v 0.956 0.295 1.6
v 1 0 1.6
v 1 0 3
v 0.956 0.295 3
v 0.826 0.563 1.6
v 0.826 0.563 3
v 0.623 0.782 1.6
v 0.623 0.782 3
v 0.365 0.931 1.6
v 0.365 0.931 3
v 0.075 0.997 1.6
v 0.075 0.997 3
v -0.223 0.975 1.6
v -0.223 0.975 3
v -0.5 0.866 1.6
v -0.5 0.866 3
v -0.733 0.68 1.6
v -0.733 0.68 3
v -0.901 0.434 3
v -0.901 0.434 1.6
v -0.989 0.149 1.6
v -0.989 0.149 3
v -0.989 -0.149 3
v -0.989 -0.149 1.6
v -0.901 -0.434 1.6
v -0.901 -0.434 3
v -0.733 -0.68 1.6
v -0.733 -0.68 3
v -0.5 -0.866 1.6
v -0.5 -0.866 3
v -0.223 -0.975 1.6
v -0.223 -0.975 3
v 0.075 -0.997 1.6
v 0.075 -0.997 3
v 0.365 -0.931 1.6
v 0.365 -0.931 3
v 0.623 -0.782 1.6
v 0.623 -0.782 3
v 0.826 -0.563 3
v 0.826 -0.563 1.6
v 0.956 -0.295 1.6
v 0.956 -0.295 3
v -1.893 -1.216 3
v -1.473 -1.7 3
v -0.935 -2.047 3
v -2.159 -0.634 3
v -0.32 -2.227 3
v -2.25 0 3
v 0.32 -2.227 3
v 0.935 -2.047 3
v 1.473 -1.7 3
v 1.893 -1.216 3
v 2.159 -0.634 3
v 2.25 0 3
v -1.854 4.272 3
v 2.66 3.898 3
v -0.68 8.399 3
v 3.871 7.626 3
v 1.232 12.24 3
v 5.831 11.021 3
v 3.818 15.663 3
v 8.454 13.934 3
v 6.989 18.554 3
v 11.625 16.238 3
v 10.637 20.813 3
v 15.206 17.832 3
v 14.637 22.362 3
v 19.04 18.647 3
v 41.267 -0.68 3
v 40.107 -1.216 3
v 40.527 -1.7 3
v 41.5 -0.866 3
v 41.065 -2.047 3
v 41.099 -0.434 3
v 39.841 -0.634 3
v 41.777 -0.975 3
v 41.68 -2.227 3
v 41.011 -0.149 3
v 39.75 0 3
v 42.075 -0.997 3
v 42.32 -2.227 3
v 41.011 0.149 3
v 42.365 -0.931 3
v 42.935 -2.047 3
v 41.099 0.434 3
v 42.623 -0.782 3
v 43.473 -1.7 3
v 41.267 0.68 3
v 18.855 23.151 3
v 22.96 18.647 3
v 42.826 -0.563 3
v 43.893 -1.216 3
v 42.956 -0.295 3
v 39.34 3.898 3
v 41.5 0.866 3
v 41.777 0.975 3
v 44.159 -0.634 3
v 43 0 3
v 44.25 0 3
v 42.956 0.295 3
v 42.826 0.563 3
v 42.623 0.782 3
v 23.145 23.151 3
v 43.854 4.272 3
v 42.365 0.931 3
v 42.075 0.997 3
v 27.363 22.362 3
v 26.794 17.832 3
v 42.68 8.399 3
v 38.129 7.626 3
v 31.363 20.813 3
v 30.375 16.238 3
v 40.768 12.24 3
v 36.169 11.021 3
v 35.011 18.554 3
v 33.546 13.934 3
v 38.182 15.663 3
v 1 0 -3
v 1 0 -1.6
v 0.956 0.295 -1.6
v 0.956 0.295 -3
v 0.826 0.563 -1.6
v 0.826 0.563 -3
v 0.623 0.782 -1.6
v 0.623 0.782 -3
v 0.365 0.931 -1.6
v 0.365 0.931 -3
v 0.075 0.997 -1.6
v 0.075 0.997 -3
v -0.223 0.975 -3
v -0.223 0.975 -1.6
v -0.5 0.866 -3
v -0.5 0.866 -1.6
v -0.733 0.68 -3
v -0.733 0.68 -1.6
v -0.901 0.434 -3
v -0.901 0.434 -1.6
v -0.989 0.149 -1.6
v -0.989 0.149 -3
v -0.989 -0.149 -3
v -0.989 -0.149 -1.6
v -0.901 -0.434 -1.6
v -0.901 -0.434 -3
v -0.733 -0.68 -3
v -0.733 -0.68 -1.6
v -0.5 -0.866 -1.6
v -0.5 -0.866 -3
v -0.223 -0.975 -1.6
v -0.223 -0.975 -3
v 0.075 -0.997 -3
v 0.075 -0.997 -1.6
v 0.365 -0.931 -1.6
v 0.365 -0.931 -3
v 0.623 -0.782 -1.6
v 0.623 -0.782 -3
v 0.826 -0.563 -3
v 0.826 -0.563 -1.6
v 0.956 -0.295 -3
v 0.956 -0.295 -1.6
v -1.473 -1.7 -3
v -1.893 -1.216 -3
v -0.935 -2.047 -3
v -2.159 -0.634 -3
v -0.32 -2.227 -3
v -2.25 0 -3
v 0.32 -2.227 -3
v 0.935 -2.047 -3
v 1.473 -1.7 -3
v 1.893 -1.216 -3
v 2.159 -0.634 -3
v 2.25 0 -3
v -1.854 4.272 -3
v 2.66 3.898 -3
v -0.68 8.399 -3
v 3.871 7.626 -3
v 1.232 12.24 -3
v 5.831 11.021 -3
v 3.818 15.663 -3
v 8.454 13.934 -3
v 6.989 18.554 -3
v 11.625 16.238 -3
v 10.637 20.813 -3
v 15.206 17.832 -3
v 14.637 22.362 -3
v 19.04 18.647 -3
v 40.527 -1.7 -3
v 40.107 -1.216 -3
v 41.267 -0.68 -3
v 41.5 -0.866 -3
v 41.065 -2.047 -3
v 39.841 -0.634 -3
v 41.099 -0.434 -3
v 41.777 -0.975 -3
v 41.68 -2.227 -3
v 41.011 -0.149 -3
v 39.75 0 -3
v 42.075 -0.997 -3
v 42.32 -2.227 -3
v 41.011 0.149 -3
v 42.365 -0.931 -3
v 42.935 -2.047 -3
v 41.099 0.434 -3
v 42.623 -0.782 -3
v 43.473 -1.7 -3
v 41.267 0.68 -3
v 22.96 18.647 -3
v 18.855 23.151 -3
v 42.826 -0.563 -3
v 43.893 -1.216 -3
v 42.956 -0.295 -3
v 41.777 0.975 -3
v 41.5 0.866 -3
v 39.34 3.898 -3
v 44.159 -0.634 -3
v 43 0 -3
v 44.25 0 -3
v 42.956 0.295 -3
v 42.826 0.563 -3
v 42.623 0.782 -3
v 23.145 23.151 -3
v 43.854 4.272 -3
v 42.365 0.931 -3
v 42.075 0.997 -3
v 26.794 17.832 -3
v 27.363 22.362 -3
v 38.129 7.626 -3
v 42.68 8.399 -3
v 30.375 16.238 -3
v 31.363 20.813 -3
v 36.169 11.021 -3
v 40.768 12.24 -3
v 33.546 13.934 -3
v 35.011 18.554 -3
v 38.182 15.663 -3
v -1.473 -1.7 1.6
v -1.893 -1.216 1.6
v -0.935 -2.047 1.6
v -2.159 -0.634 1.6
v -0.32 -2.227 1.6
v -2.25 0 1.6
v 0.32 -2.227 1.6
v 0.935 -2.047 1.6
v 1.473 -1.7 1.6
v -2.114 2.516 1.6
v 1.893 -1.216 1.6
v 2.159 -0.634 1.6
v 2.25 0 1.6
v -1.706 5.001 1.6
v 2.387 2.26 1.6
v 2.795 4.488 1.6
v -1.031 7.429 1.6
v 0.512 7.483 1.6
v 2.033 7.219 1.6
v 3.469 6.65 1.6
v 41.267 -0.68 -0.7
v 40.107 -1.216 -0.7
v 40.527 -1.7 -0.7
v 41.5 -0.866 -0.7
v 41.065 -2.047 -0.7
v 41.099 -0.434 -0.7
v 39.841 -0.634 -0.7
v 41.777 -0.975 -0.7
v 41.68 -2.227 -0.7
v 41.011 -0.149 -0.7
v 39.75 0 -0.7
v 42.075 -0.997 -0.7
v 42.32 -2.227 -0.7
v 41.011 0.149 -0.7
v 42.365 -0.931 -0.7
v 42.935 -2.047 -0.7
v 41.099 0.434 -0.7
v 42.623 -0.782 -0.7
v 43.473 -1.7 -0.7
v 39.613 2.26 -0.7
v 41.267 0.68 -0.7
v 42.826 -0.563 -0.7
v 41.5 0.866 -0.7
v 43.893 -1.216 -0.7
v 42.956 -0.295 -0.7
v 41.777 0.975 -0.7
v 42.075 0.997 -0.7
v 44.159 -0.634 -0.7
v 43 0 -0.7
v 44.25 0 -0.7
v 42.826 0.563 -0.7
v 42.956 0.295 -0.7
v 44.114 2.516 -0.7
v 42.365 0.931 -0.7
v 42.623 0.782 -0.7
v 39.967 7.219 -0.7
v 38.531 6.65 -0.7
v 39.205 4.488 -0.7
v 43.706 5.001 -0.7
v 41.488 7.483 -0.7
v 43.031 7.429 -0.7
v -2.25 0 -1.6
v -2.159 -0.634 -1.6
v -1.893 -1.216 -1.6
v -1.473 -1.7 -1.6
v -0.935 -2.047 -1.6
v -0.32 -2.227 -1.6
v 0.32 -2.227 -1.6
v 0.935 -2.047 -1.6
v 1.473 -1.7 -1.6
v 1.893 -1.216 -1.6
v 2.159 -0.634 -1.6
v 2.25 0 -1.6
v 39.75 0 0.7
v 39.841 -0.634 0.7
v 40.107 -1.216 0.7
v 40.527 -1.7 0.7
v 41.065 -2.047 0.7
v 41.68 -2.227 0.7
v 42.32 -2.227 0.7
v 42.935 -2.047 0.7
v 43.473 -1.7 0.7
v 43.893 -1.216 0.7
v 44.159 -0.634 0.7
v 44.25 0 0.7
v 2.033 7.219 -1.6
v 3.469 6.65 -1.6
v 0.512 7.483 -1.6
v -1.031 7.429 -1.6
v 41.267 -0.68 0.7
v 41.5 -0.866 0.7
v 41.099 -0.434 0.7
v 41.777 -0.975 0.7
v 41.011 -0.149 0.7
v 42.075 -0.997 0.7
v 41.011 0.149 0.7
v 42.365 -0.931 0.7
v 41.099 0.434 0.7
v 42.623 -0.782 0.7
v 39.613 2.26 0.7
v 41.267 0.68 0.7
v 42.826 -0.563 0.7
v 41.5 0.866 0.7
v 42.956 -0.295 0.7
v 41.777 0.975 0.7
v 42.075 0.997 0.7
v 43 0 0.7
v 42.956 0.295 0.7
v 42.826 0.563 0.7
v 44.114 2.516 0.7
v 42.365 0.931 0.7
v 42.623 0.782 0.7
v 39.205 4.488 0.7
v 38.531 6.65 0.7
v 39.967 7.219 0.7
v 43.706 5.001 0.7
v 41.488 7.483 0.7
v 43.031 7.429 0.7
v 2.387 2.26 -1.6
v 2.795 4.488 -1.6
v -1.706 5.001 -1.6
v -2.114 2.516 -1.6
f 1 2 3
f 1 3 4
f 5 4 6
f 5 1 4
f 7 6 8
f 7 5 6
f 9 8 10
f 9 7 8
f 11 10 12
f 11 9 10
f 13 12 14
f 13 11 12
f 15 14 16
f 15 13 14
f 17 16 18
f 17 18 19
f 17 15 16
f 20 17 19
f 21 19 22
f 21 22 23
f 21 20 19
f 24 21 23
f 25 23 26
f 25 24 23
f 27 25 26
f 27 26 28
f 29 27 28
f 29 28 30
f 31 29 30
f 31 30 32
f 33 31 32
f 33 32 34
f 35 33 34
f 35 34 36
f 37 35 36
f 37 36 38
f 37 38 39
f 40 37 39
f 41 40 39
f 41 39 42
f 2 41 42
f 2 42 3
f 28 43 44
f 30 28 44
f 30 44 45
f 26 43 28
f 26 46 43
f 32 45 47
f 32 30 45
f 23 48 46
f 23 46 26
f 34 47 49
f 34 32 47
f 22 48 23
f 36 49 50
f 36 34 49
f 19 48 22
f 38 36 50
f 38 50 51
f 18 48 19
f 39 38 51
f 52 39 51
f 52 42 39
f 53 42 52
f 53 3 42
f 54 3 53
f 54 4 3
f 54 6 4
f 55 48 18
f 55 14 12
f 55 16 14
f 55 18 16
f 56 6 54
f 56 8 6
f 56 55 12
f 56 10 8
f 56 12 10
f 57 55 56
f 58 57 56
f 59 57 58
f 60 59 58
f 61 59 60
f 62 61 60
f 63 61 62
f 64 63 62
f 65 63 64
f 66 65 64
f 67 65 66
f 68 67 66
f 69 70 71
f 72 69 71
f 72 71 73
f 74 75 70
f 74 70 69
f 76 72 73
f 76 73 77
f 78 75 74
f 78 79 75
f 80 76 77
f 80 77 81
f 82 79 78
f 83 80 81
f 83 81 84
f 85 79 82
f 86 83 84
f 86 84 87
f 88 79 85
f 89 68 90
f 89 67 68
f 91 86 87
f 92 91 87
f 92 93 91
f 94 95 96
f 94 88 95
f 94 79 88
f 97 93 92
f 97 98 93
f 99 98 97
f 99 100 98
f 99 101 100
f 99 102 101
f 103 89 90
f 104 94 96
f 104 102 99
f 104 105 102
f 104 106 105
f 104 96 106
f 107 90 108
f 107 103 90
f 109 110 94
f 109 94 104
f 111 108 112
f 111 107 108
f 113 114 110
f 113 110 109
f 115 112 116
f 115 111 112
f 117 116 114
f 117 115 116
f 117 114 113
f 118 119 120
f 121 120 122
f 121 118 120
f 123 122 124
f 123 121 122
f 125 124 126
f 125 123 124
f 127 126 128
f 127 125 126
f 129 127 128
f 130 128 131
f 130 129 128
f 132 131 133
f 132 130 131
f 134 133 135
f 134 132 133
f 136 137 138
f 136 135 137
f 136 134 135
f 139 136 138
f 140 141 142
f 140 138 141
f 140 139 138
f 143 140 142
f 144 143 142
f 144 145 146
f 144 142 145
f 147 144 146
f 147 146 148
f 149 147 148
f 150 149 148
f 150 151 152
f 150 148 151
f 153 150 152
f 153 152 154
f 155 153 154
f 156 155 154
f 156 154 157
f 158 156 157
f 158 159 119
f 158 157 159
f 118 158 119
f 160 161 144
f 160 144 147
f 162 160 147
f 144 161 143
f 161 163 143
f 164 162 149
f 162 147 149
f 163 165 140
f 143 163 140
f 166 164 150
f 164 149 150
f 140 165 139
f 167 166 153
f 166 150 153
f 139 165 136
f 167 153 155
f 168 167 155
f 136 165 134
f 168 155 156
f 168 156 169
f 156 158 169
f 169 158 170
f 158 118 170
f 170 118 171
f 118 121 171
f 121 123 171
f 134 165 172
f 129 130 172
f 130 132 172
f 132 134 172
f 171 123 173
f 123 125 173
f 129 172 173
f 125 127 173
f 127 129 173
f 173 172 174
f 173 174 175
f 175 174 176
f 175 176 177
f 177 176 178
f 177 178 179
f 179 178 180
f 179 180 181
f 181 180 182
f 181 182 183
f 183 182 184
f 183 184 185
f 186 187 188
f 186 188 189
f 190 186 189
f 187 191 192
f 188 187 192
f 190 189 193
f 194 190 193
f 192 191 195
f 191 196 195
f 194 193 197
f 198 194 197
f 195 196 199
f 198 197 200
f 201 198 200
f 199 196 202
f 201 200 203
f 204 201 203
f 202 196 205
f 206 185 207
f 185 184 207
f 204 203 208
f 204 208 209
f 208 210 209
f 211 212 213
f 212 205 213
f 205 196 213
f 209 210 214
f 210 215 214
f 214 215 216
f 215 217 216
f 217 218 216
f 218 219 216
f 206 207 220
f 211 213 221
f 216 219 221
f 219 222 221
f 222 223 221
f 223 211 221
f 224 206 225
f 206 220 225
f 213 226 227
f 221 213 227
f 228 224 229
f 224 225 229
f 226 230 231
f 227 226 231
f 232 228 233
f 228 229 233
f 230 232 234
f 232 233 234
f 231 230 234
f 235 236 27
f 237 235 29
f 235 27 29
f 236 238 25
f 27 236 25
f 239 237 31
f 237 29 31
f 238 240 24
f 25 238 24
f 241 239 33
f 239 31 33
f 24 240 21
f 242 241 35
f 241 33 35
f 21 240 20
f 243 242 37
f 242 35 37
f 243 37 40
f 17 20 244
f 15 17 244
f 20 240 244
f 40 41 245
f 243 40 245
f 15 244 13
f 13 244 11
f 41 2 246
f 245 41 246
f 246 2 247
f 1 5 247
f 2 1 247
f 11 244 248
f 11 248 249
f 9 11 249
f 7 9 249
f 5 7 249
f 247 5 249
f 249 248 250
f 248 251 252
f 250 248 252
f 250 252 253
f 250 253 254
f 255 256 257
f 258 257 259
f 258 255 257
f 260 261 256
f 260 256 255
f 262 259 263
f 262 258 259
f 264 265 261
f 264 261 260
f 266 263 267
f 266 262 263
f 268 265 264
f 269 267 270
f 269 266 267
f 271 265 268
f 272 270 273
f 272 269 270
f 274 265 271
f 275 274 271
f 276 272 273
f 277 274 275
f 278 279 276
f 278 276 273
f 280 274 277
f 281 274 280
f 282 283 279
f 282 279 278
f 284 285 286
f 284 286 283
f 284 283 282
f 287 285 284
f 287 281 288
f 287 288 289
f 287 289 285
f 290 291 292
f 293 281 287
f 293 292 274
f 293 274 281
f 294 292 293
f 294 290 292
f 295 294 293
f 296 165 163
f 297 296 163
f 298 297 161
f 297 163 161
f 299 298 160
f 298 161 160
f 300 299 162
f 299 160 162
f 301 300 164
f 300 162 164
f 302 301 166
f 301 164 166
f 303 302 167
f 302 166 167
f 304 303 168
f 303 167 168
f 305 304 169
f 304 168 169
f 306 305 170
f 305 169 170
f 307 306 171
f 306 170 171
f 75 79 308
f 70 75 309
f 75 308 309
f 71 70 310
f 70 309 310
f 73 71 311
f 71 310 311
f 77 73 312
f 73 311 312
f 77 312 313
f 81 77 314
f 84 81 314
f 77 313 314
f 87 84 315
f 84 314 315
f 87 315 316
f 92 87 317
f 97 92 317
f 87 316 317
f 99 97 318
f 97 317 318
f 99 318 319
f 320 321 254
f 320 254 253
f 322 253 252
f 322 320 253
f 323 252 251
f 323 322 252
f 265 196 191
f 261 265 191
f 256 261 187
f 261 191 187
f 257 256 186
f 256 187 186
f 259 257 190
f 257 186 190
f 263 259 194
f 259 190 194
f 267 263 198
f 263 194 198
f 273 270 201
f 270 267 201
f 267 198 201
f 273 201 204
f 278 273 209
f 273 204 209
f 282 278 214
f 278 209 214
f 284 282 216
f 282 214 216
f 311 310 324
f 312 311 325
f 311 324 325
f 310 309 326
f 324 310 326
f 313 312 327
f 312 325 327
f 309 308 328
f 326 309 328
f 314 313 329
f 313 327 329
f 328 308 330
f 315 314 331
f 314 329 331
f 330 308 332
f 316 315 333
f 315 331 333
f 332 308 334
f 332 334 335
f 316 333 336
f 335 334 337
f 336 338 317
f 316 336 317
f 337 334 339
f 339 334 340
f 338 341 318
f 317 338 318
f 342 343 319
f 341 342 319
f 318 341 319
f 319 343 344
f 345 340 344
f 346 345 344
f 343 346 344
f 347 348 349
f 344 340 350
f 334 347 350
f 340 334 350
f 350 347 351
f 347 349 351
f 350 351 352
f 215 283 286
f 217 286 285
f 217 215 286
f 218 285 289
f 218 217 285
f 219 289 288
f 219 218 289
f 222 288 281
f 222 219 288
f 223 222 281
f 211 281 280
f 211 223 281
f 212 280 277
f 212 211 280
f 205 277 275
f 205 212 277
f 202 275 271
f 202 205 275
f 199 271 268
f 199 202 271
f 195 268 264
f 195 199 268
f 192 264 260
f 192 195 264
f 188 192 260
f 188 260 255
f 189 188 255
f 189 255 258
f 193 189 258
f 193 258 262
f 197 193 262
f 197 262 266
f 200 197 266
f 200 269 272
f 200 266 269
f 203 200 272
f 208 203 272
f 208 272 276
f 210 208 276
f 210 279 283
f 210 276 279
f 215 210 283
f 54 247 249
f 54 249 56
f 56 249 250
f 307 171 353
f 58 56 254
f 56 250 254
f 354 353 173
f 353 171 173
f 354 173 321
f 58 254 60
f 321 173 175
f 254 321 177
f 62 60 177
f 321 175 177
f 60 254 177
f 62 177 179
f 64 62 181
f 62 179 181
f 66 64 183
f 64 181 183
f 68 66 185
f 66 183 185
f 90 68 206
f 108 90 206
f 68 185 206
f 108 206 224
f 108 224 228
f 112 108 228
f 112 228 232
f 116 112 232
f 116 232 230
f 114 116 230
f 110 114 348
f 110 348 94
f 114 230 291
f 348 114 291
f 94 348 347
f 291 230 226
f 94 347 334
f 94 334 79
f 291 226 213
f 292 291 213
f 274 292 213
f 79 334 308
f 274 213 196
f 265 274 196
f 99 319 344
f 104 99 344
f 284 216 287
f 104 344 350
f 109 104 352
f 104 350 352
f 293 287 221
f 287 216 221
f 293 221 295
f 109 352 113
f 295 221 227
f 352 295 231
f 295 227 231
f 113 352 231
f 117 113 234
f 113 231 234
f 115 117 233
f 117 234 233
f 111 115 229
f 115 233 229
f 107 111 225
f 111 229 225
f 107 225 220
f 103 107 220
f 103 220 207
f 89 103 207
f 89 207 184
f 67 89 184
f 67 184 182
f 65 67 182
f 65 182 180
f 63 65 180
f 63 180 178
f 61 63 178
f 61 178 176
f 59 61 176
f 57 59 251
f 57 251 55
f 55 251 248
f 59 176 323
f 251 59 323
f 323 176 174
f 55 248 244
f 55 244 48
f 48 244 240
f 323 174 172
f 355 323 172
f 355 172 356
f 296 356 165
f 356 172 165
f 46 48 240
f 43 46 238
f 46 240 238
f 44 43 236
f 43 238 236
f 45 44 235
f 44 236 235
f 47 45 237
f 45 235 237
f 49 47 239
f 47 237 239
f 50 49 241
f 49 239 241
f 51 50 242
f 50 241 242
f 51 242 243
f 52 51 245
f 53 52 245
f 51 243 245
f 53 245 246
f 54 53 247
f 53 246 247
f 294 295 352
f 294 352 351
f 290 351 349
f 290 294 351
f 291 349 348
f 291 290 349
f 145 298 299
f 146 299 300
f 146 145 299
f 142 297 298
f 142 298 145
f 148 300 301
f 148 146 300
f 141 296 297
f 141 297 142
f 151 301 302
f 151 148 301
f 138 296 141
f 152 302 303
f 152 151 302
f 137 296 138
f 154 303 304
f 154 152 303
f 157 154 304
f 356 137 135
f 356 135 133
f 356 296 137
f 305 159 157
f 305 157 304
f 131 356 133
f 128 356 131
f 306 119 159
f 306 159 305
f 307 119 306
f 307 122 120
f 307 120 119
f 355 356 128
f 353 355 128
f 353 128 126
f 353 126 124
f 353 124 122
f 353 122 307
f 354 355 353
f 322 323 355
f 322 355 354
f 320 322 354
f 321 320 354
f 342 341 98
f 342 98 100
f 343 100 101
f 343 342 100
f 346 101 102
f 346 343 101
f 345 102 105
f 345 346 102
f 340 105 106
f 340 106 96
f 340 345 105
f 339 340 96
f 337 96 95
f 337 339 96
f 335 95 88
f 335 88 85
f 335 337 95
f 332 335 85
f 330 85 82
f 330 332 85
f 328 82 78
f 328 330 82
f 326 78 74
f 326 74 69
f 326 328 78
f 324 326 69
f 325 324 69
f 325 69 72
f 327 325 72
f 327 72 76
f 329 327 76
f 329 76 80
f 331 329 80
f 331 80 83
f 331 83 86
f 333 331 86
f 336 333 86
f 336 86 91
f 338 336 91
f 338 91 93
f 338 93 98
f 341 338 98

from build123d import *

# Parameters (mm, degrees)
BOSS_EXTRUDE1_DEPTH      = 3
BOSS_EXTRUDE1_DEPTH_BACK = 3
SKETCH1_R                = 1
CUT_EXTRUDE1_DEPTH       = 1.6
CUT_EXTRUDE1_DEPTH_BACK  = 1.6
SKETCH2_R                = 7.5
CUT_EXTRUDE2_DEPTH       = 0.7
CUT_EXTRUDE2_DEPTH_BACK  = 0.7
SKETCH3_R                = 7.5


with BuildPart() as part:
    # Sketch1 → Boss-Extrude1 (new, two sides: drawn at the far end of the back side and taken through both)
    with BuildSketch(Plane.XY.offset(-BOSS_EXTRUDE1_DEPTH_BACK)):
        with BuildLine():
            ThreePointArc((-2.25, 0), (0, -2.25), (2.25, 0))
            ThreePointArc((2.25, 0), (21, 18.75), (39.75, 0))
            ThreePointArc((39.75, 0), (42, -2.25), (44.25, 0))
            ThreePointArc((44.25, 0), (21, 23.25), (-2.25, 0))
        make_face()
        Circle(SKETCH1_R, mode=Mode.SUBTRACT)
        with Locations((42, 0)):
            Circle(SKETCH1_R, mode=Mode.SUBTRACT)
    extrude(amount=BOSS_EXTRUDE1_DEPTH + BOSS_EXTRUDE1_DEPTH_BACK)

    # Sketch2 → Cut-Extrude1 (cut, two sides: drawn at the far end of the back side and taken through both)
    with BuildSketch(Plane.XY.offset(-CUT_EXTRUDE1_DEPTH_BACK)):
        Circle(SKETCH2_R)
    extrude(amount=CUT_EXTRUDE1_DEPTH + CUT_EXTRUDE1_DEPTH_BACK, mode=Mode.SUBTRACT)

    # Sketch3 → Cut-Extrude2 (cut, two sides: drawn at the far end of the back side and taken through both)
    with BuildSketch(Plane.XY.offset(-CUT_EXTRUDE2_DEPTH_BACK)):
        with Locations((42, 0)):
            Circle(SKETCH3_R)
    extrude(amount=CUT_EXTRUDE2_DEPTH + CUT_EXTRUDE2_DEPTH_BACK, mode=Mode.SUBTRACT)


solid = part.part
